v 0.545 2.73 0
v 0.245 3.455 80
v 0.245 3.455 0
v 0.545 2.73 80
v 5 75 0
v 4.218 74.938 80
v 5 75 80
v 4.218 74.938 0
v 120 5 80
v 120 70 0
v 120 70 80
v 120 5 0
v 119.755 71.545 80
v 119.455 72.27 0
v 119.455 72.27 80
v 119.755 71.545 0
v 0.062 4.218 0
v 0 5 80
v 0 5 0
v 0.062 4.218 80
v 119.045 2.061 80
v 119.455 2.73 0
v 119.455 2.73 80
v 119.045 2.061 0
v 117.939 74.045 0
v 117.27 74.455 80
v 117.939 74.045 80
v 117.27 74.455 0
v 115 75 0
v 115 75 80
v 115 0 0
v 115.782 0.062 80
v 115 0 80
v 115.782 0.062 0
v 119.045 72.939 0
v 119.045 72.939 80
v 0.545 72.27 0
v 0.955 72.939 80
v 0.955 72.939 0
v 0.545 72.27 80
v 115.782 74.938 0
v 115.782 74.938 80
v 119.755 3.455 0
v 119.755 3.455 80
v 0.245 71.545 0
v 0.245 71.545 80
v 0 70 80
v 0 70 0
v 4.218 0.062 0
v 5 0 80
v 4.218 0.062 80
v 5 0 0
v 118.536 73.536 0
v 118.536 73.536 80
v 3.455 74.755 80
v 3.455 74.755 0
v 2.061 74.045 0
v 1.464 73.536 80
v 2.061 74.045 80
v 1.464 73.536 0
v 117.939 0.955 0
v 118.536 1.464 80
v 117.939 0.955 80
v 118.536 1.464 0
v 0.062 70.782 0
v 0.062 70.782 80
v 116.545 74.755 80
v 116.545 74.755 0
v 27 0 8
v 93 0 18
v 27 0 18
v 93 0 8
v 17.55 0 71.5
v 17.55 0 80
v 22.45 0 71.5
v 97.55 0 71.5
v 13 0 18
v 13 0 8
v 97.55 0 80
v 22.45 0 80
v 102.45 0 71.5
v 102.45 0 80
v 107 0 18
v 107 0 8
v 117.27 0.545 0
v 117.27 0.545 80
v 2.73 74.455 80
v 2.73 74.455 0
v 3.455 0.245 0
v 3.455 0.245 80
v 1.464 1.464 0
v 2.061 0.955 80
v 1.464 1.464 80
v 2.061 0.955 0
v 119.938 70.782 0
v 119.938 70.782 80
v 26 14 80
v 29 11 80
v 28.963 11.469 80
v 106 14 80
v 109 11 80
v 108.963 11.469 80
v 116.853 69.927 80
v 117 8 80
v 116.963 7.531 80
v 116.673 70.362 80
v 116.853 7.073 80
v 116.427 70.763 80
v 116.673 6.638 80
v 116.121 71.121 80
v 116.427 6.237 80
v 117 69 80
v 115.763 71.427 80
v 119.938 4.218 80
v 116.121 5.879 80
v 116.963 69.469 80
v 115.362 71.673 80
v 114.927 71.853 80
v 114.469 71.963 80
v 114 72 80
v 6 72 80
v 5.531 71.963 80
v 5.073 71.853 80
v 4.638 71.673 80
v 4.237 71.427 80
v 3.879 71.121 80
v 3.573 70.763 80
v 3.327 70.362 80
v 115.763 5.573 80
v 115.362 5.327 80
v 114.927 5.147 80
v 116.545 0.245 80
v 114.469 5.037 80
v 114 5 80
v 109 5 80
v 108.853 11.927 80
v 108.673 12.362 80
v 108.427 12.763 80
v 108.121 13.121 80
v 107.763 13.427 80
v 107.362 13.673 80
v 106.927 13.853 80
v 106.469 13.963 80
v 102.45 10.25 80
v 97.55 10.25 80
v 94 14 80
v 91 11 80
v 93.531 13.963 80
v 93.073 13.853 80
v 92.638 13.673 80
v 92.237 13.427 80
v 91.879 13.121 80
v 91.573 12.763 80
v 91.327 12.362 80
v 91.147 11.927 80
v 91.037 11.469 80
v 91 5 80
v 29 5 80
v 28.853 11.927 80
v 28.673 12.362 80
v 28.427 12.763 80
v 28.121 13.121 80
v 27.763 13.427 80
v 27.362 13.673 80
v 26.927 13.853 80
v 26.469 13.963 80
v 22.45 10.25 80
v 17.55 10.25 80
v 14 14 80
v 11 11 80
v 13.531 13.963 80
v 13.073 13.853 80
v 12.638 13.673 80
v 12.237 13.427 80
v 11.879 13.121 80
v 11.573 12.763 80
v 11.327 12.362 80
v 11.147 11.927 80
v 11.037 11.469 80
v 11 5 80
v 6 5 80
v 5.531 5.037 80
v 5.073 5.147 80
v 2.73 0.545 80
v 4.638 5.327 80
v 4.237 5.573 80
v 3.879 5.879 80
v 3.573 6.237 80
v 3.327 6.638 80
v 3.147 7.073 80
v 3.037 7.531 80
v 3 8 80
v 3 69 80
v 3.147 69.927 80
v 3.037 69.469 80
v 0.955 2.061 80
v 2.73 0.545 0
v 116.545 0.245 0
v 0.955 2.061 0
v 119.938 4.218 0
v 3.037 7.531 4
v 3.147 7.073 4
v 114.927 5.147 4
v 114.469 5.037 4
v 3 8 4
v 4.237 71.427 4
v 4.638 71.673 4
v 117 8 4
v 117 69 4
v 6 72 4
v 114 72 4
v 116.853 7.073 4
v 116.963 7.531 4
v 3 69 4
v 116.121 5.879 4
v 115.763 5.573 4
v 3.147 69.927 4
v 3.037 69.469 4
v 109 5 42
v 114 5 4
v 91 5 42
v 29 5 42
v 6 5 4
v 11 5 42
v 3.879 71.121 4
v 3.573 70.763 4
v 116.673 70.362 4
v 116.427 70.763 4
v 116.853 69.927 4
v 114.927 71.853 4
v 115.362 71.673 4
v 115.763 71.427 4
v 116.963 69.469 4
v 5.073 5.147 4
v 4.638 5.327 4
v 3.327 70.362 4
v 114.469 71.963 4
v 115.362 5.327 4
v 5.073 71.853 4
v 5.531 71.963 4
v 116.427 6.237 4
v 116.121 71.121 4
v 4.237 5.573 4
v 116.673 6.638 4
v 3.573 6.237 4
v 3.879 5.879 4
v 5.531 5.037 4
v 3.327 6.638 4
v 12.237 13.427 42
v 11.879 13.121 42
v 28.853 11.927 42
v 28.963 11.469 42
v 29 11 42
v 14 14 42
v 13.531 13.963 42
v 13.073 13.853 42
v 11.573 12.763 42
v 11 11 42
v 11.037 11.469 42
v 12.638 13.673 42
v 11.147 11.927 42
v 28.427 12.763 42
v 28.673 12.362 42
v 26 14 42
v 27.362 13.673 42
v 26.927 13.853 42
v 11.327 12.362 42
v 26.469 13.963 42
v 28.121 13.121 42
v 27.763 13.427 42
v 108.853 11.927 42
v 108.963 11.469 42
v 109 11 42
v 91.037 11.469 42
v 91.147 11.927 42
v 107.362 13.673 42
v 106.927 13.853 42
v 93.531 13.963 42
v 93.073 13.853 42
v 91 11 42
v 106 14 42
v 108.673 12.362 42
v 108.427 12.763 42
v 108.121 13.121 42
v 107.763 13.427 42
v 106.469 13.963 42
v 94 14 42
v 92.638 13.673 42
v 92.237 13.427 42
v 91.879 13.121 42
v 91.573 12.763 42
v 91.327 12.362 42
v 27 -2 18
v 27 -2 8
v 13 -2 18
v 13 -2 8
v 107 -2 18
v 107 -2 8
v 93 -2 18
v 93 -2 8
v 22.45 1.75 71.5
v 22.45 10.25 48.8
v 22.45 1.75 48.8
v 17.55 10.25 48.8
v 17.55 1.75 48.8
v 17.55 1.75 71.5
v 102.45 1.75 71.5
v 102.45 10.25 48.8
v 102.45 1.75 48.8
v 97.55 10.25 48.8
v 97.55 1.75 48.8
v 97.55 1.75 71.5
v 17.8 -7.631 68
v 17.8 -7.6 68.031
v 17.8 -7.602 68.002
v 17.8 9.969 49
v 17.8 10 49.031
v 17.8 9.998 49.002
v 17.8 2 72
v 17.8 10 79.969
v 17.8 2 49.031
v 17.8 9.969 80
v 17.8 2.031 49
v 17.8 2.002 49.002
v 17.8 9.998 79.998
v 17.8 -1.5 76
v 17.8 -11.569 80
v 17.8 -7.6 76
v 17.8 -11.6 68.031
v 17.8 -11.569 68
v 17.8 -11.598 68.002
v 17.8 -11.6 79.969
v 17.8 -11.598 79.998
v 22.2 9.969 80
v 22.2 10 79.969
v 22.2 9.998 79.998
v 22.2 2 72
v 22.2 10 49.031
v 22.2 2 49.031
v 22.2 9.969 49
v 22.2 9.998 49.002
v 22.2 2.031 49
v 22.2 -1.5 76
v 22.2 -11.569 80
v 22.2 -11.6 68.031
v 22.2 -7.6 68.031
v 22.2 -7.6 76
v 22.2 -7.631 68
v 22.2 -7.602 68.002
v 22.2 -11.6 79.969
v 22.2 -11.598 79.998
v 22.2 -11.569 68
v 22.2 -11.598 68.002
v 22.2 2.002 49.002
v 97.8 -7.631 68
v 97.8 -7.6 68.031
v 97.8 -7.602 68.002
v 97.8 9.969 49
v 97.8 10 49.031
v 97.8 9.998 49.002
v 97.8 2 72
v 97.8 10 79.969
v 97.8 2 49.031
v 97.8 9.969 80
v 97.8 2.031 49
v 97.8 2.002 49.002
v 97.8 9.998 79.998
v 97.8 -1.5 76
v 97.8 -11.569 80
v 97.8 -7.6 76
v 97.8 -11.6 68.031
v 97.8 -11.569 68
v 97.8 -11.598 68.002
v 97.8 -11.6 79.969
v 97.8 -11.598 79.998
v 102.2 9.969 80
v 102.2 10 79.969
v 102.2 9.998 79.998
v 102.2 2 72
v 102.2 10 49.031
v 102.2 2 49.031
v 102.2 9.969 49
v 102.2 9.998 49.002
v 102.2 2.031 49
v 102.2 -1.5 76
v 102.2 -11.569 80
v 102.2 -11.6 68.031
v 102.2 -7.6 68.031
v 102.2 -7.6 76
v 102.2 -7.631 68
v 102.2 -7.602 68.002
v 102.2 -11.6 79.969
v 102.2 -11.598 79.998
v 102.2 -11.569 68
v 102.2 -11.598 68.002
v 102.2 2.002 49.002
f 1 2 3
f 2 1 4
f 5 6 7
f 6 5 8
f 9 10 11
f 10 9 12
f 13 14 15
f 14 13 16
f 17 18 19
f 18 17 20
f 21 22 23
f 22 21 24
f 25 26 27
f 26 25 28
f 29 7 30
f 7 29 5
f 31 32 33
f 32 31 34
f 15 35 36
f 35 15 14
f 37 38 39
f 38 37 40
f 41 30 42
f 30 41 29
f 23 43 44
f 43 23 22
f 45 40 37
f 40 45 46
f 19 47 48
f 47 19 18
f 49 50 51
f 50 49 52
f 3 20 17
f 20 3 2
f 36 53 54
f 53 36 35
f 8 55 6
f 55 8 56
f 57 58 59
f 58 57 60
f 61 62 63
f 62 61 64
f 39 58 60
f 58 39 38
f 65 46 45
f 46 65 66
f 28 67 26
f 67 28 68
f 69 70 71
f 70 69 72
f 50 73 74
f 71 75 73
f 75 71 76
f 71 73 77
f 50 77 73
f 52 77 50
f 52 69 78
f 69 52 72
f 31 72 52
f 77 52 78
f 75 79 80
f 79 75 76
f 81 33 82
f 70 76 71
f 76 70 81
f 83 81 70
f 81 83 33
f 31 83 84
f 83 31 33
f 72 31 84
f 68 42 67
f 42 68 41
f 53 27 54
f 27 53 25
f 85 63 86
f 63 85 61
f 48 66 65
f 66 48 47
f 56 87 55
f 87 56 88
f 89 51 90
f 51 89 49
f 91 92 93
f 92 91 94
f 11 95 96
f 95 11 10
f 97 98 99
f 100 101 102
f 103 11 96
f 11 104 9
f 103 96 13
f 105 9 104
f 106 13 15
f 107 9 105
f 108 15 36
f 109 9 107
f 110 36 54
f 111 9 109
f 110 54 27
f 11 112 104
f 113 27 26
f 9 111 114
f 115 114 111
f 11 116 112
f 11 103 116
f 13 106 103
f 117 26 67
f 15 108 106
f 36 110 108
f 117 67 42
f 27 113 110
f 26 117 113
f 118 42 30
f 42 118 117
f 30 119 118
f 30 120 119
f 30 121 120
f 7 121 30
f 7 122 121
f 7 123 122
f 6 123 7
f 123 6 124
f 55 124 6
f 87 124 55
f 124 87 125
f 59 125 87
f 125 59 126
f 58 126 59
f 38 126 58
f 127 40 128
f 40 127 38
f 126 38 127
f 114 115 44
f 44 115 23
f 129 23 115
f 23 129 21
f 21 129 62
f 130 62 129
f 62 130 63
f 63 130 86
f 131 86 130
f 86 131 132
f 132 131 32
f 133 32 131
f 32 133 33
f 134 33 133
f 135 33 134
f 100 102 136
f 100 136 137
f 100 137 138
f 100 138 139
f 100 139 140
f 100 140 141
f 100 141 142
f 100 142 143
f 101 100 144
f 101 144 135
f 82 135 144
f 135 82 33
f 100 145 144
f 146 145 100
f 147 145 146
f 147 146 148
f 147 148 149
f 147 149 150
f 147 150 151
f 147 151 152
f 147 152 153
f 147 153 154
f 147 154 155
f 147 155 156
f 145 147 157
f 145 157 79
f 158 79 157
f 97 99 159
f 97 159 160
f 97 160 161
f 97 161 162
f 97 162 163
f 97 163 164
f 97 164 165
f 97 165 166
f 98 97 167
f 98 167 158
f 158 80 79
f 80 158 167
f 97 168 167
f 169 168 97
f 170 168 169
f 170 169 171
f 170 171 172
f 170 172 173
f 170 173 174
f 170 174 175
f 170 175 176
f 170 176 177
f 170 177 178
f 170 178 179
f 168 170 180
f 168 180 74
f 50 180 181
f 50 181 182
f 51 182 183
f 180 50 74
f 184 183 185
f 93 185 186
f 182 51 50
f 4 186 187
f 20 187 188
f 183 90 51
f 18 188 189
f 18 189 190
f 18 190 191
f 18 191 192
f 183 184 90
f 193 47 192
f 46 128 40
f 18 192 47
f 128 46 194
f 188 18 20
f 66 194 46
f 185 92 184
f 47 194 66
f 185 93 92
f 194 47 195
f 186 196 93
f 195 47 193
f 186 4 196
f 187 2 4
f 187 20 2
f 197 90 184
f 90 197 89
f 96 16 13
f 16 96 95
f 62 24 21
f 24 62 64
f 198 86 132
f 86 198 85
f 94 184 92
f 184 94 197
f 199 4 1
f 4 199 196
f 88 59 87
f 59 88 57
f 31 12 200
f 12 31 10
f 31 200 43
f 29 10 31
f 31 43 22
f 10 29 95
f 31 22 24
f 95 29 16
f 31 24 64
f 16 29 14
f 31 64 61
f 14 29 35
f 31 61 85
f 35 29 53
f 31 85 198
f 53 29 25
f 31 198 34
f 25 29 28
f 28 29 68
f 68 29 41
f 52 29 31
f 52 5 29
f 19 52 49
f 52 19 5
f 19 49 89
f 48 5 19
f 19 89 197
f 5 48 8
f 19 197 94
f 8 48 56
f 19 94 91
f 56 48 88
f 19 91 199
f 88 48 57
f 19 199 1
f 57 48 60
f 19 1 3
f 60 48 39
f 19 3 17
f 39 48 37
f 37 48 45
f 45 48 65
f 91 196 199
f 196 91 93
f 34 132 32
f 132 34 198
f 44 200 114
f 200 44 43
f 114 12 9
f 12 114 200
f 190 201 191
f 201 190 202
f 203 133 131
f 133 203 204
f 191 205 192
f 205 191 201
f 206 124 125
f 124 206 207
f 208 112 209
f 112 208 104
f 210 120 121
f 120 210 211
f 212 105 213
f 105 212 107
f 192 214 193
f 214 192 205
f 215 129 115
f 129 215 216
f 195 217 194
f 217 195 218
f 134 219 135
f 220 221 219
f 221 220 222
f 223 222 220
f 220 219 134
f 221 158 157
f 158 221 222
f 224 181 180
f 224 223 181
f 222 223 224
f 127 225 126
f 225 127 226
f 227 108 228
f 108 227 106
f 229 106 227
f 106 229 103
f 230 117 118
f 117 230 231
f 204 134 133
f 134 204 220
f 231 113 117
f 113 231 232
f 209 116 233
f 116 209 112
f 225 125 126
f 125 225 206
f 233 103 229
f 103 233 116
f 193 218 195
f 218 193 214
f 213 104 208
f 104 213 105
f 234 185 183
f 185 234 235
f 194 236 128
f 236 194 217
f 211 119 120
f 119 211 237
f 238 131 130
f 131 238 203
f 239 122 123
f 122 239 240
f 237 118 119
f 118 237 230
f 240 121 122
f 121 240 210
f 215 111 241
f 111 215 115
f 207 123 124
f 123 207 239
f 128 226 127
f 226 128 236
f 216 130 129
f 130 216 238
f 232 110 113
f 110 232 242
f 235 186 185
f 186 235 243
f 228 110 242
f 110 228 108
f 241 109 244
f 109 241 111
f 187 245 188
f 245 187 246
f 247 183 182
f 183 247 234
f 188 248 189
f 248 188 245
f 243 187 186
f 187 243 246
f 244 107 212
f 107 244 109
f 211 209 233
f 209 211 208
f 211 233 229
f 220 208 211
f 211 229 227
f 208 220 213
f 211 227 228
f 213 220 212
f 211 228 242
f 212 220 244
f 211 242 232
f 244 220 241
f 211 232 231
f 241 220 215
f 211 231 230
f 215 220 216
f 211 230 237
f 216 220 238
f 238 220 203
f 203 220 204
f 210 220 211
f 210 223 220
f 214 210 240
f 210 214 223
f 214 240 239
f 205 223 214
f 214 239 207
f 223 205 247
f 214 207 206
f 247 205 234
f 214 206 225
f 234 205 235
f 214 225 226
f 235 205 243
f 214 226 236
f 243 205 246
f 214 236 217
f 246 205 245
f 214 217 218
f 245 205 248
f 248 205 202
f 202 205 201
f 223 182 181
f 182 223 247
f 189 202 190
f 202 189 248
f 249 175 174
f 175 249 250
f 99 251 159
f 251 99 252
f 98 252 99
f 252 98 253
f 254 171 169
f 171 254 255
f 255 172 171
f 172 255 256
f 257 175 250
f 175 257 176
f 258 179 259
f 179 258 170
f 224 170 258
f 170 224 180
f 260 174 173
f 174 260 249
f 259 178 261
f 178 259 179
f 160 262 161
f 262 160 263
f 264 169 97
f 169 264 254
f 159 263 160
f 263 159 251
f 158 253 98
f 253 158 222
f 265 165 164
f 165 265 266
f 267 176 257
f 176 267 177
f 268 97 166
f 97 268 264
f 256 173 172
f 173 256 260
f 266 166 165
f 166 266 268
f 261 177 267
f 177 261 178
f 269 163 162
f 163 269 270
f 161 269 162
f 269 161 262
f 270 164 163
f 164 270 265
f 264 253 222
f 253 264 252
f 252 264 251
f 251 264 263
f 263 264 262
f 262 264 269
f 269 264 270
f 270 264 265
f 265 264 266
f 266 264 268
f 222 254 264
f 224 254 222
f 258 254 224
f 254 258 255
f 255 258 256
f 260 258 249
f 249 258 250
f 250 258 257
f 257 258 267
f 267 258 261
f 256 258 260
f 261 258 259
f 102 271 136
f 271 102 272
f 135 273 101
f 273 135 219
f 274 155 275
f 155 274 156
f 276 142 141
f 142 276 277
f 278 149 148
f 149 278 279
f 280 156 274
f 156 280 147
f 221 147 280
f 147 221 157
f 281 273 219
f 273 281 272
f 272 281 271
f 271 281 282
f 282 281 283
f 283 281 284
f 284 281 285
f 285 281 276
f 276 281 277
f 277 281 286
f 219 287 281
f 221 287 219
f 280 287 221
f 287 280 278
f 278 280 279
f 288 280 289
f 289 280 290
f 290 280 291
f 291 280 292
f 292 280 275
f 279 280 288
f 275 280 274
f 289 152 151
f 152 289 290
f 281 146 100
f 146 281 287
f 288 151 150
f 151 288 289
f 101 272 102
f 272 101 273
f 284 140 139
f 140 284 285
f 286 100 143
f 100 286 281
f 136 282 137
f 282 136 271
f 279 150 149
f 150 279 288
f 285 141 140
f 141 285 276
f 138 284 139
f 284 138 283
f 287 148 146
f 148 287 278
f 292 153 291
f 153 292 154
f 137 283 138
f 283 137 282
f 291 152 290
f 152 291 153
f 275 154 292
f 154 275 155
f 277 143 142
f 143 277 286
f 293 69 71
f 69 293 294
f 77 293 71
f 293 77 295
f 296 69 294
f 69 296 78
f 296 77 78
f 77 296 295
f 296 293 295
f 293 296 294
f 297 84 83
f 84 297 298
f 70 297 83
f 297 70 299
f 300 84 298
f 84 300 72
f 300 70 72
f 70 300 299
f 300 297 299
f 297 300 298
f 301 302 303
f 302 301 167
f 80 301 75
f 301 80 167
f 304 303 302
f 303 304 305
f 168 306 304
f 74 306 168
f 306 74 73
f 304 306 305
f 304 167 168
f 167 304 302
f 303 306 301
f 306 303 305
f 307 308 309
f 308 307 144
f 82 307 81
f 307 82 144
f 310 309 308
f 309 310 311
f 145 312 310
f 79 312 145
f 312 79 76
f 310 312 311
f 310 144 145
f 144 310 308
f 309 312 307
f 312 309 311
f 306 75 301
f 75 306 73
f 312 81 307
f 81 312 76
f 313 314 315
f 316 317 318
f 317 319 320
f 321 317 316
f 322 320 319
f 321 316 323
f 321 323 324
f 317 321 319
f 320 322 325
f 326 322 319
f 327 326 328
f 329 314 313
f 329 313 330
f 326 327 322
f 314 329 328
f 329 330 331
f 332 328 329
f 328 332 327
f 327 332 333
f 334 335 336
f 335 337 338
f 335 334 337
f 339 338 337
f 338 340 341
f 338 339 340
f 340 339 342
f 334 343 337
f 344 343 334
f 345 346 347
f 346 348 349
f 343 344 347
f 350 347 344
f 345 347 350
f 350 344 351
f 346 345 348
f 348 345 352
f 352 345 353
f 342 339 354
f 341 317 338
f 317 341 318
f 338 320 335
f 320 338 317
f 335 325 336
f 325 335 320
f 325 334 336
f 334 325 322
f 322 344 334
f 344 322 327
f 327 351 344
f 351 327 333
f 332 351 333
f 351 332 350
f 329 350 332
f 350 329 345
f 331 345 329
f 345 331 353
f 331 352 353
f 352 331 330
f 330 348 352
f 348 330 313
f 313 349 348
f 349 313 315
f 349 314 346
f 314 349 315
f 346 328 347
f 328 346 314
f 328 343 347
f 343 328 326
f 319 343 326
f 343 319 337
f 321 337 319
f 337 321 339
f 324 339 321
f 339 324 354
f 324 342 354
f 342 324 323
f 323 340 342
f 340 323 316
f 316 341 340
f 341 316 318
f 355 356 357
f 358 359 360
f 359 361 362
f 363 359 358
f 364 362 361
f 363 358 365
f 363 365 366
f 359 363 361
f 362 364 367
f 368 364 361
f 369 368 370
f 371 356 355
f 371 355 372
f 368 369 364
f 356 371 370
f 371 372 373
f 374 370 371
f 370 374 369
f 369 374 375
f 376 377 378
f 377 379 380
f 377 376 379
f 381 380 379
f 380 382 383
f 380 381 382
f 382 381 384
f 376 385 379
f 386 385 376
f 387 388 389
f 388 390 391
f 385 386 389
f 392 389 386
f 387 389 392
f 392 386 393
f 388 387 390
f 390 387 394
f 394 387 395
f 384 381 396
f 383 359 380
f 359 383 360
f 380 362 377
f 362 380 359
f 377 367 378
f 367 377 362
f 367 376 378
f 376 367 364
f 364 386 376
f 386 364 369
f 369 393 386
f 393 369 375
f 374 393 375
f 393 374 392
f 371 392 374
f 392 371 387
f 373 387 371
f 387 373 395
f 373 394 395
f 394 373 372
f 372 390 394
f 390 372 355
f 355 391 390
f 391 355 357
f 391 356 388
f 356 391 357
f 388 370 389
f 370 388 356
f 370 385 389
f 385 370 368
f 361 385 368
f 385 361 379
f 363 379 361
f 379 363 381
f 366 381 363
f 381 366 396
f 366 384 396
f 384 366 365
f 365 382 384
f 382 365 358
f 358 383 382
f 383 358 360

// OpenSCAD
// SKADIS slide-in box with two replaceable hooks, printed on their sides.
part = 0; // [0:Assembly,1:Box,2:Hook]
width = 120;
depth = 75;
height = 80;
hook_width = 4.4;
socket_clearance = 0.25;
$fn = 40;
module rr(w,d,r) { hull() for(x=[r,w-r]) for(y=[r,d-r]) translate([x,y]) circle(r=r); }
module body() {
 difference() {
  union() {
   difference() {
    linear_extrude(height) rr(width,depth,5);
    translate([3,5,4]) linear_extrude(height) rr(width-6,depth-8,3);
   }
   for(x=[20,100]) translate([x-9,0,42]) linear_extrude(38) rr(18,14,3);
   for(x=[20,100]) translate([x-7,-2,8]) cube([14,3,10]);
  }
  for(x=[20,100]) translate([x-hook_width/2-socket_clearance,2-socket_clearance,48.8])
   cube([hook_width+2*socket_clearance,8+2*socket_clearance,32]);
  for(x=[20,100]) translate([x-hook_width/2-socket_clearance,-1,71.5]) cube([hook_width+2*socket_clearance,3.3,9]);
 }
}
// Profile is in board-normal / vertical axes. Rounded inside elbow spreads stress.
// Board occupies y=-7..-2; inner hook face y=-7.6 gives 0.6 mm clearance.
module hook_profile() {
 offset(delta=-0.8) offset(r=0.8) union() {
  translate([2,49]) square([8,30]);
  translate([-11.6,76]) square([21.6,4]);
  translate([-11.6,68]) square([4,12]);
  polygon([[-1.5,76],[2,72],[5,76]]);
 }
}
module hook_print() { translate([12,-49,0]) linear_extrude(hook_width) hook_profile(); }
module hook_mounted(x) {
 translate([x-hook_width/2,0,0])
 multmatrix([[0,0,1,0],[1,0,0,0],[0,1,0,0],[0,0,0,1]]) linear_extrude(hook_width) hook_profile();
}
if(part==1) body();
else if(part==2) hook_print();
else {
 color([0.18,0.55,0.64]) body();
 for(x=[20,100]) color([0.95,0.65,0.22]) hook_mounted(x);
}
